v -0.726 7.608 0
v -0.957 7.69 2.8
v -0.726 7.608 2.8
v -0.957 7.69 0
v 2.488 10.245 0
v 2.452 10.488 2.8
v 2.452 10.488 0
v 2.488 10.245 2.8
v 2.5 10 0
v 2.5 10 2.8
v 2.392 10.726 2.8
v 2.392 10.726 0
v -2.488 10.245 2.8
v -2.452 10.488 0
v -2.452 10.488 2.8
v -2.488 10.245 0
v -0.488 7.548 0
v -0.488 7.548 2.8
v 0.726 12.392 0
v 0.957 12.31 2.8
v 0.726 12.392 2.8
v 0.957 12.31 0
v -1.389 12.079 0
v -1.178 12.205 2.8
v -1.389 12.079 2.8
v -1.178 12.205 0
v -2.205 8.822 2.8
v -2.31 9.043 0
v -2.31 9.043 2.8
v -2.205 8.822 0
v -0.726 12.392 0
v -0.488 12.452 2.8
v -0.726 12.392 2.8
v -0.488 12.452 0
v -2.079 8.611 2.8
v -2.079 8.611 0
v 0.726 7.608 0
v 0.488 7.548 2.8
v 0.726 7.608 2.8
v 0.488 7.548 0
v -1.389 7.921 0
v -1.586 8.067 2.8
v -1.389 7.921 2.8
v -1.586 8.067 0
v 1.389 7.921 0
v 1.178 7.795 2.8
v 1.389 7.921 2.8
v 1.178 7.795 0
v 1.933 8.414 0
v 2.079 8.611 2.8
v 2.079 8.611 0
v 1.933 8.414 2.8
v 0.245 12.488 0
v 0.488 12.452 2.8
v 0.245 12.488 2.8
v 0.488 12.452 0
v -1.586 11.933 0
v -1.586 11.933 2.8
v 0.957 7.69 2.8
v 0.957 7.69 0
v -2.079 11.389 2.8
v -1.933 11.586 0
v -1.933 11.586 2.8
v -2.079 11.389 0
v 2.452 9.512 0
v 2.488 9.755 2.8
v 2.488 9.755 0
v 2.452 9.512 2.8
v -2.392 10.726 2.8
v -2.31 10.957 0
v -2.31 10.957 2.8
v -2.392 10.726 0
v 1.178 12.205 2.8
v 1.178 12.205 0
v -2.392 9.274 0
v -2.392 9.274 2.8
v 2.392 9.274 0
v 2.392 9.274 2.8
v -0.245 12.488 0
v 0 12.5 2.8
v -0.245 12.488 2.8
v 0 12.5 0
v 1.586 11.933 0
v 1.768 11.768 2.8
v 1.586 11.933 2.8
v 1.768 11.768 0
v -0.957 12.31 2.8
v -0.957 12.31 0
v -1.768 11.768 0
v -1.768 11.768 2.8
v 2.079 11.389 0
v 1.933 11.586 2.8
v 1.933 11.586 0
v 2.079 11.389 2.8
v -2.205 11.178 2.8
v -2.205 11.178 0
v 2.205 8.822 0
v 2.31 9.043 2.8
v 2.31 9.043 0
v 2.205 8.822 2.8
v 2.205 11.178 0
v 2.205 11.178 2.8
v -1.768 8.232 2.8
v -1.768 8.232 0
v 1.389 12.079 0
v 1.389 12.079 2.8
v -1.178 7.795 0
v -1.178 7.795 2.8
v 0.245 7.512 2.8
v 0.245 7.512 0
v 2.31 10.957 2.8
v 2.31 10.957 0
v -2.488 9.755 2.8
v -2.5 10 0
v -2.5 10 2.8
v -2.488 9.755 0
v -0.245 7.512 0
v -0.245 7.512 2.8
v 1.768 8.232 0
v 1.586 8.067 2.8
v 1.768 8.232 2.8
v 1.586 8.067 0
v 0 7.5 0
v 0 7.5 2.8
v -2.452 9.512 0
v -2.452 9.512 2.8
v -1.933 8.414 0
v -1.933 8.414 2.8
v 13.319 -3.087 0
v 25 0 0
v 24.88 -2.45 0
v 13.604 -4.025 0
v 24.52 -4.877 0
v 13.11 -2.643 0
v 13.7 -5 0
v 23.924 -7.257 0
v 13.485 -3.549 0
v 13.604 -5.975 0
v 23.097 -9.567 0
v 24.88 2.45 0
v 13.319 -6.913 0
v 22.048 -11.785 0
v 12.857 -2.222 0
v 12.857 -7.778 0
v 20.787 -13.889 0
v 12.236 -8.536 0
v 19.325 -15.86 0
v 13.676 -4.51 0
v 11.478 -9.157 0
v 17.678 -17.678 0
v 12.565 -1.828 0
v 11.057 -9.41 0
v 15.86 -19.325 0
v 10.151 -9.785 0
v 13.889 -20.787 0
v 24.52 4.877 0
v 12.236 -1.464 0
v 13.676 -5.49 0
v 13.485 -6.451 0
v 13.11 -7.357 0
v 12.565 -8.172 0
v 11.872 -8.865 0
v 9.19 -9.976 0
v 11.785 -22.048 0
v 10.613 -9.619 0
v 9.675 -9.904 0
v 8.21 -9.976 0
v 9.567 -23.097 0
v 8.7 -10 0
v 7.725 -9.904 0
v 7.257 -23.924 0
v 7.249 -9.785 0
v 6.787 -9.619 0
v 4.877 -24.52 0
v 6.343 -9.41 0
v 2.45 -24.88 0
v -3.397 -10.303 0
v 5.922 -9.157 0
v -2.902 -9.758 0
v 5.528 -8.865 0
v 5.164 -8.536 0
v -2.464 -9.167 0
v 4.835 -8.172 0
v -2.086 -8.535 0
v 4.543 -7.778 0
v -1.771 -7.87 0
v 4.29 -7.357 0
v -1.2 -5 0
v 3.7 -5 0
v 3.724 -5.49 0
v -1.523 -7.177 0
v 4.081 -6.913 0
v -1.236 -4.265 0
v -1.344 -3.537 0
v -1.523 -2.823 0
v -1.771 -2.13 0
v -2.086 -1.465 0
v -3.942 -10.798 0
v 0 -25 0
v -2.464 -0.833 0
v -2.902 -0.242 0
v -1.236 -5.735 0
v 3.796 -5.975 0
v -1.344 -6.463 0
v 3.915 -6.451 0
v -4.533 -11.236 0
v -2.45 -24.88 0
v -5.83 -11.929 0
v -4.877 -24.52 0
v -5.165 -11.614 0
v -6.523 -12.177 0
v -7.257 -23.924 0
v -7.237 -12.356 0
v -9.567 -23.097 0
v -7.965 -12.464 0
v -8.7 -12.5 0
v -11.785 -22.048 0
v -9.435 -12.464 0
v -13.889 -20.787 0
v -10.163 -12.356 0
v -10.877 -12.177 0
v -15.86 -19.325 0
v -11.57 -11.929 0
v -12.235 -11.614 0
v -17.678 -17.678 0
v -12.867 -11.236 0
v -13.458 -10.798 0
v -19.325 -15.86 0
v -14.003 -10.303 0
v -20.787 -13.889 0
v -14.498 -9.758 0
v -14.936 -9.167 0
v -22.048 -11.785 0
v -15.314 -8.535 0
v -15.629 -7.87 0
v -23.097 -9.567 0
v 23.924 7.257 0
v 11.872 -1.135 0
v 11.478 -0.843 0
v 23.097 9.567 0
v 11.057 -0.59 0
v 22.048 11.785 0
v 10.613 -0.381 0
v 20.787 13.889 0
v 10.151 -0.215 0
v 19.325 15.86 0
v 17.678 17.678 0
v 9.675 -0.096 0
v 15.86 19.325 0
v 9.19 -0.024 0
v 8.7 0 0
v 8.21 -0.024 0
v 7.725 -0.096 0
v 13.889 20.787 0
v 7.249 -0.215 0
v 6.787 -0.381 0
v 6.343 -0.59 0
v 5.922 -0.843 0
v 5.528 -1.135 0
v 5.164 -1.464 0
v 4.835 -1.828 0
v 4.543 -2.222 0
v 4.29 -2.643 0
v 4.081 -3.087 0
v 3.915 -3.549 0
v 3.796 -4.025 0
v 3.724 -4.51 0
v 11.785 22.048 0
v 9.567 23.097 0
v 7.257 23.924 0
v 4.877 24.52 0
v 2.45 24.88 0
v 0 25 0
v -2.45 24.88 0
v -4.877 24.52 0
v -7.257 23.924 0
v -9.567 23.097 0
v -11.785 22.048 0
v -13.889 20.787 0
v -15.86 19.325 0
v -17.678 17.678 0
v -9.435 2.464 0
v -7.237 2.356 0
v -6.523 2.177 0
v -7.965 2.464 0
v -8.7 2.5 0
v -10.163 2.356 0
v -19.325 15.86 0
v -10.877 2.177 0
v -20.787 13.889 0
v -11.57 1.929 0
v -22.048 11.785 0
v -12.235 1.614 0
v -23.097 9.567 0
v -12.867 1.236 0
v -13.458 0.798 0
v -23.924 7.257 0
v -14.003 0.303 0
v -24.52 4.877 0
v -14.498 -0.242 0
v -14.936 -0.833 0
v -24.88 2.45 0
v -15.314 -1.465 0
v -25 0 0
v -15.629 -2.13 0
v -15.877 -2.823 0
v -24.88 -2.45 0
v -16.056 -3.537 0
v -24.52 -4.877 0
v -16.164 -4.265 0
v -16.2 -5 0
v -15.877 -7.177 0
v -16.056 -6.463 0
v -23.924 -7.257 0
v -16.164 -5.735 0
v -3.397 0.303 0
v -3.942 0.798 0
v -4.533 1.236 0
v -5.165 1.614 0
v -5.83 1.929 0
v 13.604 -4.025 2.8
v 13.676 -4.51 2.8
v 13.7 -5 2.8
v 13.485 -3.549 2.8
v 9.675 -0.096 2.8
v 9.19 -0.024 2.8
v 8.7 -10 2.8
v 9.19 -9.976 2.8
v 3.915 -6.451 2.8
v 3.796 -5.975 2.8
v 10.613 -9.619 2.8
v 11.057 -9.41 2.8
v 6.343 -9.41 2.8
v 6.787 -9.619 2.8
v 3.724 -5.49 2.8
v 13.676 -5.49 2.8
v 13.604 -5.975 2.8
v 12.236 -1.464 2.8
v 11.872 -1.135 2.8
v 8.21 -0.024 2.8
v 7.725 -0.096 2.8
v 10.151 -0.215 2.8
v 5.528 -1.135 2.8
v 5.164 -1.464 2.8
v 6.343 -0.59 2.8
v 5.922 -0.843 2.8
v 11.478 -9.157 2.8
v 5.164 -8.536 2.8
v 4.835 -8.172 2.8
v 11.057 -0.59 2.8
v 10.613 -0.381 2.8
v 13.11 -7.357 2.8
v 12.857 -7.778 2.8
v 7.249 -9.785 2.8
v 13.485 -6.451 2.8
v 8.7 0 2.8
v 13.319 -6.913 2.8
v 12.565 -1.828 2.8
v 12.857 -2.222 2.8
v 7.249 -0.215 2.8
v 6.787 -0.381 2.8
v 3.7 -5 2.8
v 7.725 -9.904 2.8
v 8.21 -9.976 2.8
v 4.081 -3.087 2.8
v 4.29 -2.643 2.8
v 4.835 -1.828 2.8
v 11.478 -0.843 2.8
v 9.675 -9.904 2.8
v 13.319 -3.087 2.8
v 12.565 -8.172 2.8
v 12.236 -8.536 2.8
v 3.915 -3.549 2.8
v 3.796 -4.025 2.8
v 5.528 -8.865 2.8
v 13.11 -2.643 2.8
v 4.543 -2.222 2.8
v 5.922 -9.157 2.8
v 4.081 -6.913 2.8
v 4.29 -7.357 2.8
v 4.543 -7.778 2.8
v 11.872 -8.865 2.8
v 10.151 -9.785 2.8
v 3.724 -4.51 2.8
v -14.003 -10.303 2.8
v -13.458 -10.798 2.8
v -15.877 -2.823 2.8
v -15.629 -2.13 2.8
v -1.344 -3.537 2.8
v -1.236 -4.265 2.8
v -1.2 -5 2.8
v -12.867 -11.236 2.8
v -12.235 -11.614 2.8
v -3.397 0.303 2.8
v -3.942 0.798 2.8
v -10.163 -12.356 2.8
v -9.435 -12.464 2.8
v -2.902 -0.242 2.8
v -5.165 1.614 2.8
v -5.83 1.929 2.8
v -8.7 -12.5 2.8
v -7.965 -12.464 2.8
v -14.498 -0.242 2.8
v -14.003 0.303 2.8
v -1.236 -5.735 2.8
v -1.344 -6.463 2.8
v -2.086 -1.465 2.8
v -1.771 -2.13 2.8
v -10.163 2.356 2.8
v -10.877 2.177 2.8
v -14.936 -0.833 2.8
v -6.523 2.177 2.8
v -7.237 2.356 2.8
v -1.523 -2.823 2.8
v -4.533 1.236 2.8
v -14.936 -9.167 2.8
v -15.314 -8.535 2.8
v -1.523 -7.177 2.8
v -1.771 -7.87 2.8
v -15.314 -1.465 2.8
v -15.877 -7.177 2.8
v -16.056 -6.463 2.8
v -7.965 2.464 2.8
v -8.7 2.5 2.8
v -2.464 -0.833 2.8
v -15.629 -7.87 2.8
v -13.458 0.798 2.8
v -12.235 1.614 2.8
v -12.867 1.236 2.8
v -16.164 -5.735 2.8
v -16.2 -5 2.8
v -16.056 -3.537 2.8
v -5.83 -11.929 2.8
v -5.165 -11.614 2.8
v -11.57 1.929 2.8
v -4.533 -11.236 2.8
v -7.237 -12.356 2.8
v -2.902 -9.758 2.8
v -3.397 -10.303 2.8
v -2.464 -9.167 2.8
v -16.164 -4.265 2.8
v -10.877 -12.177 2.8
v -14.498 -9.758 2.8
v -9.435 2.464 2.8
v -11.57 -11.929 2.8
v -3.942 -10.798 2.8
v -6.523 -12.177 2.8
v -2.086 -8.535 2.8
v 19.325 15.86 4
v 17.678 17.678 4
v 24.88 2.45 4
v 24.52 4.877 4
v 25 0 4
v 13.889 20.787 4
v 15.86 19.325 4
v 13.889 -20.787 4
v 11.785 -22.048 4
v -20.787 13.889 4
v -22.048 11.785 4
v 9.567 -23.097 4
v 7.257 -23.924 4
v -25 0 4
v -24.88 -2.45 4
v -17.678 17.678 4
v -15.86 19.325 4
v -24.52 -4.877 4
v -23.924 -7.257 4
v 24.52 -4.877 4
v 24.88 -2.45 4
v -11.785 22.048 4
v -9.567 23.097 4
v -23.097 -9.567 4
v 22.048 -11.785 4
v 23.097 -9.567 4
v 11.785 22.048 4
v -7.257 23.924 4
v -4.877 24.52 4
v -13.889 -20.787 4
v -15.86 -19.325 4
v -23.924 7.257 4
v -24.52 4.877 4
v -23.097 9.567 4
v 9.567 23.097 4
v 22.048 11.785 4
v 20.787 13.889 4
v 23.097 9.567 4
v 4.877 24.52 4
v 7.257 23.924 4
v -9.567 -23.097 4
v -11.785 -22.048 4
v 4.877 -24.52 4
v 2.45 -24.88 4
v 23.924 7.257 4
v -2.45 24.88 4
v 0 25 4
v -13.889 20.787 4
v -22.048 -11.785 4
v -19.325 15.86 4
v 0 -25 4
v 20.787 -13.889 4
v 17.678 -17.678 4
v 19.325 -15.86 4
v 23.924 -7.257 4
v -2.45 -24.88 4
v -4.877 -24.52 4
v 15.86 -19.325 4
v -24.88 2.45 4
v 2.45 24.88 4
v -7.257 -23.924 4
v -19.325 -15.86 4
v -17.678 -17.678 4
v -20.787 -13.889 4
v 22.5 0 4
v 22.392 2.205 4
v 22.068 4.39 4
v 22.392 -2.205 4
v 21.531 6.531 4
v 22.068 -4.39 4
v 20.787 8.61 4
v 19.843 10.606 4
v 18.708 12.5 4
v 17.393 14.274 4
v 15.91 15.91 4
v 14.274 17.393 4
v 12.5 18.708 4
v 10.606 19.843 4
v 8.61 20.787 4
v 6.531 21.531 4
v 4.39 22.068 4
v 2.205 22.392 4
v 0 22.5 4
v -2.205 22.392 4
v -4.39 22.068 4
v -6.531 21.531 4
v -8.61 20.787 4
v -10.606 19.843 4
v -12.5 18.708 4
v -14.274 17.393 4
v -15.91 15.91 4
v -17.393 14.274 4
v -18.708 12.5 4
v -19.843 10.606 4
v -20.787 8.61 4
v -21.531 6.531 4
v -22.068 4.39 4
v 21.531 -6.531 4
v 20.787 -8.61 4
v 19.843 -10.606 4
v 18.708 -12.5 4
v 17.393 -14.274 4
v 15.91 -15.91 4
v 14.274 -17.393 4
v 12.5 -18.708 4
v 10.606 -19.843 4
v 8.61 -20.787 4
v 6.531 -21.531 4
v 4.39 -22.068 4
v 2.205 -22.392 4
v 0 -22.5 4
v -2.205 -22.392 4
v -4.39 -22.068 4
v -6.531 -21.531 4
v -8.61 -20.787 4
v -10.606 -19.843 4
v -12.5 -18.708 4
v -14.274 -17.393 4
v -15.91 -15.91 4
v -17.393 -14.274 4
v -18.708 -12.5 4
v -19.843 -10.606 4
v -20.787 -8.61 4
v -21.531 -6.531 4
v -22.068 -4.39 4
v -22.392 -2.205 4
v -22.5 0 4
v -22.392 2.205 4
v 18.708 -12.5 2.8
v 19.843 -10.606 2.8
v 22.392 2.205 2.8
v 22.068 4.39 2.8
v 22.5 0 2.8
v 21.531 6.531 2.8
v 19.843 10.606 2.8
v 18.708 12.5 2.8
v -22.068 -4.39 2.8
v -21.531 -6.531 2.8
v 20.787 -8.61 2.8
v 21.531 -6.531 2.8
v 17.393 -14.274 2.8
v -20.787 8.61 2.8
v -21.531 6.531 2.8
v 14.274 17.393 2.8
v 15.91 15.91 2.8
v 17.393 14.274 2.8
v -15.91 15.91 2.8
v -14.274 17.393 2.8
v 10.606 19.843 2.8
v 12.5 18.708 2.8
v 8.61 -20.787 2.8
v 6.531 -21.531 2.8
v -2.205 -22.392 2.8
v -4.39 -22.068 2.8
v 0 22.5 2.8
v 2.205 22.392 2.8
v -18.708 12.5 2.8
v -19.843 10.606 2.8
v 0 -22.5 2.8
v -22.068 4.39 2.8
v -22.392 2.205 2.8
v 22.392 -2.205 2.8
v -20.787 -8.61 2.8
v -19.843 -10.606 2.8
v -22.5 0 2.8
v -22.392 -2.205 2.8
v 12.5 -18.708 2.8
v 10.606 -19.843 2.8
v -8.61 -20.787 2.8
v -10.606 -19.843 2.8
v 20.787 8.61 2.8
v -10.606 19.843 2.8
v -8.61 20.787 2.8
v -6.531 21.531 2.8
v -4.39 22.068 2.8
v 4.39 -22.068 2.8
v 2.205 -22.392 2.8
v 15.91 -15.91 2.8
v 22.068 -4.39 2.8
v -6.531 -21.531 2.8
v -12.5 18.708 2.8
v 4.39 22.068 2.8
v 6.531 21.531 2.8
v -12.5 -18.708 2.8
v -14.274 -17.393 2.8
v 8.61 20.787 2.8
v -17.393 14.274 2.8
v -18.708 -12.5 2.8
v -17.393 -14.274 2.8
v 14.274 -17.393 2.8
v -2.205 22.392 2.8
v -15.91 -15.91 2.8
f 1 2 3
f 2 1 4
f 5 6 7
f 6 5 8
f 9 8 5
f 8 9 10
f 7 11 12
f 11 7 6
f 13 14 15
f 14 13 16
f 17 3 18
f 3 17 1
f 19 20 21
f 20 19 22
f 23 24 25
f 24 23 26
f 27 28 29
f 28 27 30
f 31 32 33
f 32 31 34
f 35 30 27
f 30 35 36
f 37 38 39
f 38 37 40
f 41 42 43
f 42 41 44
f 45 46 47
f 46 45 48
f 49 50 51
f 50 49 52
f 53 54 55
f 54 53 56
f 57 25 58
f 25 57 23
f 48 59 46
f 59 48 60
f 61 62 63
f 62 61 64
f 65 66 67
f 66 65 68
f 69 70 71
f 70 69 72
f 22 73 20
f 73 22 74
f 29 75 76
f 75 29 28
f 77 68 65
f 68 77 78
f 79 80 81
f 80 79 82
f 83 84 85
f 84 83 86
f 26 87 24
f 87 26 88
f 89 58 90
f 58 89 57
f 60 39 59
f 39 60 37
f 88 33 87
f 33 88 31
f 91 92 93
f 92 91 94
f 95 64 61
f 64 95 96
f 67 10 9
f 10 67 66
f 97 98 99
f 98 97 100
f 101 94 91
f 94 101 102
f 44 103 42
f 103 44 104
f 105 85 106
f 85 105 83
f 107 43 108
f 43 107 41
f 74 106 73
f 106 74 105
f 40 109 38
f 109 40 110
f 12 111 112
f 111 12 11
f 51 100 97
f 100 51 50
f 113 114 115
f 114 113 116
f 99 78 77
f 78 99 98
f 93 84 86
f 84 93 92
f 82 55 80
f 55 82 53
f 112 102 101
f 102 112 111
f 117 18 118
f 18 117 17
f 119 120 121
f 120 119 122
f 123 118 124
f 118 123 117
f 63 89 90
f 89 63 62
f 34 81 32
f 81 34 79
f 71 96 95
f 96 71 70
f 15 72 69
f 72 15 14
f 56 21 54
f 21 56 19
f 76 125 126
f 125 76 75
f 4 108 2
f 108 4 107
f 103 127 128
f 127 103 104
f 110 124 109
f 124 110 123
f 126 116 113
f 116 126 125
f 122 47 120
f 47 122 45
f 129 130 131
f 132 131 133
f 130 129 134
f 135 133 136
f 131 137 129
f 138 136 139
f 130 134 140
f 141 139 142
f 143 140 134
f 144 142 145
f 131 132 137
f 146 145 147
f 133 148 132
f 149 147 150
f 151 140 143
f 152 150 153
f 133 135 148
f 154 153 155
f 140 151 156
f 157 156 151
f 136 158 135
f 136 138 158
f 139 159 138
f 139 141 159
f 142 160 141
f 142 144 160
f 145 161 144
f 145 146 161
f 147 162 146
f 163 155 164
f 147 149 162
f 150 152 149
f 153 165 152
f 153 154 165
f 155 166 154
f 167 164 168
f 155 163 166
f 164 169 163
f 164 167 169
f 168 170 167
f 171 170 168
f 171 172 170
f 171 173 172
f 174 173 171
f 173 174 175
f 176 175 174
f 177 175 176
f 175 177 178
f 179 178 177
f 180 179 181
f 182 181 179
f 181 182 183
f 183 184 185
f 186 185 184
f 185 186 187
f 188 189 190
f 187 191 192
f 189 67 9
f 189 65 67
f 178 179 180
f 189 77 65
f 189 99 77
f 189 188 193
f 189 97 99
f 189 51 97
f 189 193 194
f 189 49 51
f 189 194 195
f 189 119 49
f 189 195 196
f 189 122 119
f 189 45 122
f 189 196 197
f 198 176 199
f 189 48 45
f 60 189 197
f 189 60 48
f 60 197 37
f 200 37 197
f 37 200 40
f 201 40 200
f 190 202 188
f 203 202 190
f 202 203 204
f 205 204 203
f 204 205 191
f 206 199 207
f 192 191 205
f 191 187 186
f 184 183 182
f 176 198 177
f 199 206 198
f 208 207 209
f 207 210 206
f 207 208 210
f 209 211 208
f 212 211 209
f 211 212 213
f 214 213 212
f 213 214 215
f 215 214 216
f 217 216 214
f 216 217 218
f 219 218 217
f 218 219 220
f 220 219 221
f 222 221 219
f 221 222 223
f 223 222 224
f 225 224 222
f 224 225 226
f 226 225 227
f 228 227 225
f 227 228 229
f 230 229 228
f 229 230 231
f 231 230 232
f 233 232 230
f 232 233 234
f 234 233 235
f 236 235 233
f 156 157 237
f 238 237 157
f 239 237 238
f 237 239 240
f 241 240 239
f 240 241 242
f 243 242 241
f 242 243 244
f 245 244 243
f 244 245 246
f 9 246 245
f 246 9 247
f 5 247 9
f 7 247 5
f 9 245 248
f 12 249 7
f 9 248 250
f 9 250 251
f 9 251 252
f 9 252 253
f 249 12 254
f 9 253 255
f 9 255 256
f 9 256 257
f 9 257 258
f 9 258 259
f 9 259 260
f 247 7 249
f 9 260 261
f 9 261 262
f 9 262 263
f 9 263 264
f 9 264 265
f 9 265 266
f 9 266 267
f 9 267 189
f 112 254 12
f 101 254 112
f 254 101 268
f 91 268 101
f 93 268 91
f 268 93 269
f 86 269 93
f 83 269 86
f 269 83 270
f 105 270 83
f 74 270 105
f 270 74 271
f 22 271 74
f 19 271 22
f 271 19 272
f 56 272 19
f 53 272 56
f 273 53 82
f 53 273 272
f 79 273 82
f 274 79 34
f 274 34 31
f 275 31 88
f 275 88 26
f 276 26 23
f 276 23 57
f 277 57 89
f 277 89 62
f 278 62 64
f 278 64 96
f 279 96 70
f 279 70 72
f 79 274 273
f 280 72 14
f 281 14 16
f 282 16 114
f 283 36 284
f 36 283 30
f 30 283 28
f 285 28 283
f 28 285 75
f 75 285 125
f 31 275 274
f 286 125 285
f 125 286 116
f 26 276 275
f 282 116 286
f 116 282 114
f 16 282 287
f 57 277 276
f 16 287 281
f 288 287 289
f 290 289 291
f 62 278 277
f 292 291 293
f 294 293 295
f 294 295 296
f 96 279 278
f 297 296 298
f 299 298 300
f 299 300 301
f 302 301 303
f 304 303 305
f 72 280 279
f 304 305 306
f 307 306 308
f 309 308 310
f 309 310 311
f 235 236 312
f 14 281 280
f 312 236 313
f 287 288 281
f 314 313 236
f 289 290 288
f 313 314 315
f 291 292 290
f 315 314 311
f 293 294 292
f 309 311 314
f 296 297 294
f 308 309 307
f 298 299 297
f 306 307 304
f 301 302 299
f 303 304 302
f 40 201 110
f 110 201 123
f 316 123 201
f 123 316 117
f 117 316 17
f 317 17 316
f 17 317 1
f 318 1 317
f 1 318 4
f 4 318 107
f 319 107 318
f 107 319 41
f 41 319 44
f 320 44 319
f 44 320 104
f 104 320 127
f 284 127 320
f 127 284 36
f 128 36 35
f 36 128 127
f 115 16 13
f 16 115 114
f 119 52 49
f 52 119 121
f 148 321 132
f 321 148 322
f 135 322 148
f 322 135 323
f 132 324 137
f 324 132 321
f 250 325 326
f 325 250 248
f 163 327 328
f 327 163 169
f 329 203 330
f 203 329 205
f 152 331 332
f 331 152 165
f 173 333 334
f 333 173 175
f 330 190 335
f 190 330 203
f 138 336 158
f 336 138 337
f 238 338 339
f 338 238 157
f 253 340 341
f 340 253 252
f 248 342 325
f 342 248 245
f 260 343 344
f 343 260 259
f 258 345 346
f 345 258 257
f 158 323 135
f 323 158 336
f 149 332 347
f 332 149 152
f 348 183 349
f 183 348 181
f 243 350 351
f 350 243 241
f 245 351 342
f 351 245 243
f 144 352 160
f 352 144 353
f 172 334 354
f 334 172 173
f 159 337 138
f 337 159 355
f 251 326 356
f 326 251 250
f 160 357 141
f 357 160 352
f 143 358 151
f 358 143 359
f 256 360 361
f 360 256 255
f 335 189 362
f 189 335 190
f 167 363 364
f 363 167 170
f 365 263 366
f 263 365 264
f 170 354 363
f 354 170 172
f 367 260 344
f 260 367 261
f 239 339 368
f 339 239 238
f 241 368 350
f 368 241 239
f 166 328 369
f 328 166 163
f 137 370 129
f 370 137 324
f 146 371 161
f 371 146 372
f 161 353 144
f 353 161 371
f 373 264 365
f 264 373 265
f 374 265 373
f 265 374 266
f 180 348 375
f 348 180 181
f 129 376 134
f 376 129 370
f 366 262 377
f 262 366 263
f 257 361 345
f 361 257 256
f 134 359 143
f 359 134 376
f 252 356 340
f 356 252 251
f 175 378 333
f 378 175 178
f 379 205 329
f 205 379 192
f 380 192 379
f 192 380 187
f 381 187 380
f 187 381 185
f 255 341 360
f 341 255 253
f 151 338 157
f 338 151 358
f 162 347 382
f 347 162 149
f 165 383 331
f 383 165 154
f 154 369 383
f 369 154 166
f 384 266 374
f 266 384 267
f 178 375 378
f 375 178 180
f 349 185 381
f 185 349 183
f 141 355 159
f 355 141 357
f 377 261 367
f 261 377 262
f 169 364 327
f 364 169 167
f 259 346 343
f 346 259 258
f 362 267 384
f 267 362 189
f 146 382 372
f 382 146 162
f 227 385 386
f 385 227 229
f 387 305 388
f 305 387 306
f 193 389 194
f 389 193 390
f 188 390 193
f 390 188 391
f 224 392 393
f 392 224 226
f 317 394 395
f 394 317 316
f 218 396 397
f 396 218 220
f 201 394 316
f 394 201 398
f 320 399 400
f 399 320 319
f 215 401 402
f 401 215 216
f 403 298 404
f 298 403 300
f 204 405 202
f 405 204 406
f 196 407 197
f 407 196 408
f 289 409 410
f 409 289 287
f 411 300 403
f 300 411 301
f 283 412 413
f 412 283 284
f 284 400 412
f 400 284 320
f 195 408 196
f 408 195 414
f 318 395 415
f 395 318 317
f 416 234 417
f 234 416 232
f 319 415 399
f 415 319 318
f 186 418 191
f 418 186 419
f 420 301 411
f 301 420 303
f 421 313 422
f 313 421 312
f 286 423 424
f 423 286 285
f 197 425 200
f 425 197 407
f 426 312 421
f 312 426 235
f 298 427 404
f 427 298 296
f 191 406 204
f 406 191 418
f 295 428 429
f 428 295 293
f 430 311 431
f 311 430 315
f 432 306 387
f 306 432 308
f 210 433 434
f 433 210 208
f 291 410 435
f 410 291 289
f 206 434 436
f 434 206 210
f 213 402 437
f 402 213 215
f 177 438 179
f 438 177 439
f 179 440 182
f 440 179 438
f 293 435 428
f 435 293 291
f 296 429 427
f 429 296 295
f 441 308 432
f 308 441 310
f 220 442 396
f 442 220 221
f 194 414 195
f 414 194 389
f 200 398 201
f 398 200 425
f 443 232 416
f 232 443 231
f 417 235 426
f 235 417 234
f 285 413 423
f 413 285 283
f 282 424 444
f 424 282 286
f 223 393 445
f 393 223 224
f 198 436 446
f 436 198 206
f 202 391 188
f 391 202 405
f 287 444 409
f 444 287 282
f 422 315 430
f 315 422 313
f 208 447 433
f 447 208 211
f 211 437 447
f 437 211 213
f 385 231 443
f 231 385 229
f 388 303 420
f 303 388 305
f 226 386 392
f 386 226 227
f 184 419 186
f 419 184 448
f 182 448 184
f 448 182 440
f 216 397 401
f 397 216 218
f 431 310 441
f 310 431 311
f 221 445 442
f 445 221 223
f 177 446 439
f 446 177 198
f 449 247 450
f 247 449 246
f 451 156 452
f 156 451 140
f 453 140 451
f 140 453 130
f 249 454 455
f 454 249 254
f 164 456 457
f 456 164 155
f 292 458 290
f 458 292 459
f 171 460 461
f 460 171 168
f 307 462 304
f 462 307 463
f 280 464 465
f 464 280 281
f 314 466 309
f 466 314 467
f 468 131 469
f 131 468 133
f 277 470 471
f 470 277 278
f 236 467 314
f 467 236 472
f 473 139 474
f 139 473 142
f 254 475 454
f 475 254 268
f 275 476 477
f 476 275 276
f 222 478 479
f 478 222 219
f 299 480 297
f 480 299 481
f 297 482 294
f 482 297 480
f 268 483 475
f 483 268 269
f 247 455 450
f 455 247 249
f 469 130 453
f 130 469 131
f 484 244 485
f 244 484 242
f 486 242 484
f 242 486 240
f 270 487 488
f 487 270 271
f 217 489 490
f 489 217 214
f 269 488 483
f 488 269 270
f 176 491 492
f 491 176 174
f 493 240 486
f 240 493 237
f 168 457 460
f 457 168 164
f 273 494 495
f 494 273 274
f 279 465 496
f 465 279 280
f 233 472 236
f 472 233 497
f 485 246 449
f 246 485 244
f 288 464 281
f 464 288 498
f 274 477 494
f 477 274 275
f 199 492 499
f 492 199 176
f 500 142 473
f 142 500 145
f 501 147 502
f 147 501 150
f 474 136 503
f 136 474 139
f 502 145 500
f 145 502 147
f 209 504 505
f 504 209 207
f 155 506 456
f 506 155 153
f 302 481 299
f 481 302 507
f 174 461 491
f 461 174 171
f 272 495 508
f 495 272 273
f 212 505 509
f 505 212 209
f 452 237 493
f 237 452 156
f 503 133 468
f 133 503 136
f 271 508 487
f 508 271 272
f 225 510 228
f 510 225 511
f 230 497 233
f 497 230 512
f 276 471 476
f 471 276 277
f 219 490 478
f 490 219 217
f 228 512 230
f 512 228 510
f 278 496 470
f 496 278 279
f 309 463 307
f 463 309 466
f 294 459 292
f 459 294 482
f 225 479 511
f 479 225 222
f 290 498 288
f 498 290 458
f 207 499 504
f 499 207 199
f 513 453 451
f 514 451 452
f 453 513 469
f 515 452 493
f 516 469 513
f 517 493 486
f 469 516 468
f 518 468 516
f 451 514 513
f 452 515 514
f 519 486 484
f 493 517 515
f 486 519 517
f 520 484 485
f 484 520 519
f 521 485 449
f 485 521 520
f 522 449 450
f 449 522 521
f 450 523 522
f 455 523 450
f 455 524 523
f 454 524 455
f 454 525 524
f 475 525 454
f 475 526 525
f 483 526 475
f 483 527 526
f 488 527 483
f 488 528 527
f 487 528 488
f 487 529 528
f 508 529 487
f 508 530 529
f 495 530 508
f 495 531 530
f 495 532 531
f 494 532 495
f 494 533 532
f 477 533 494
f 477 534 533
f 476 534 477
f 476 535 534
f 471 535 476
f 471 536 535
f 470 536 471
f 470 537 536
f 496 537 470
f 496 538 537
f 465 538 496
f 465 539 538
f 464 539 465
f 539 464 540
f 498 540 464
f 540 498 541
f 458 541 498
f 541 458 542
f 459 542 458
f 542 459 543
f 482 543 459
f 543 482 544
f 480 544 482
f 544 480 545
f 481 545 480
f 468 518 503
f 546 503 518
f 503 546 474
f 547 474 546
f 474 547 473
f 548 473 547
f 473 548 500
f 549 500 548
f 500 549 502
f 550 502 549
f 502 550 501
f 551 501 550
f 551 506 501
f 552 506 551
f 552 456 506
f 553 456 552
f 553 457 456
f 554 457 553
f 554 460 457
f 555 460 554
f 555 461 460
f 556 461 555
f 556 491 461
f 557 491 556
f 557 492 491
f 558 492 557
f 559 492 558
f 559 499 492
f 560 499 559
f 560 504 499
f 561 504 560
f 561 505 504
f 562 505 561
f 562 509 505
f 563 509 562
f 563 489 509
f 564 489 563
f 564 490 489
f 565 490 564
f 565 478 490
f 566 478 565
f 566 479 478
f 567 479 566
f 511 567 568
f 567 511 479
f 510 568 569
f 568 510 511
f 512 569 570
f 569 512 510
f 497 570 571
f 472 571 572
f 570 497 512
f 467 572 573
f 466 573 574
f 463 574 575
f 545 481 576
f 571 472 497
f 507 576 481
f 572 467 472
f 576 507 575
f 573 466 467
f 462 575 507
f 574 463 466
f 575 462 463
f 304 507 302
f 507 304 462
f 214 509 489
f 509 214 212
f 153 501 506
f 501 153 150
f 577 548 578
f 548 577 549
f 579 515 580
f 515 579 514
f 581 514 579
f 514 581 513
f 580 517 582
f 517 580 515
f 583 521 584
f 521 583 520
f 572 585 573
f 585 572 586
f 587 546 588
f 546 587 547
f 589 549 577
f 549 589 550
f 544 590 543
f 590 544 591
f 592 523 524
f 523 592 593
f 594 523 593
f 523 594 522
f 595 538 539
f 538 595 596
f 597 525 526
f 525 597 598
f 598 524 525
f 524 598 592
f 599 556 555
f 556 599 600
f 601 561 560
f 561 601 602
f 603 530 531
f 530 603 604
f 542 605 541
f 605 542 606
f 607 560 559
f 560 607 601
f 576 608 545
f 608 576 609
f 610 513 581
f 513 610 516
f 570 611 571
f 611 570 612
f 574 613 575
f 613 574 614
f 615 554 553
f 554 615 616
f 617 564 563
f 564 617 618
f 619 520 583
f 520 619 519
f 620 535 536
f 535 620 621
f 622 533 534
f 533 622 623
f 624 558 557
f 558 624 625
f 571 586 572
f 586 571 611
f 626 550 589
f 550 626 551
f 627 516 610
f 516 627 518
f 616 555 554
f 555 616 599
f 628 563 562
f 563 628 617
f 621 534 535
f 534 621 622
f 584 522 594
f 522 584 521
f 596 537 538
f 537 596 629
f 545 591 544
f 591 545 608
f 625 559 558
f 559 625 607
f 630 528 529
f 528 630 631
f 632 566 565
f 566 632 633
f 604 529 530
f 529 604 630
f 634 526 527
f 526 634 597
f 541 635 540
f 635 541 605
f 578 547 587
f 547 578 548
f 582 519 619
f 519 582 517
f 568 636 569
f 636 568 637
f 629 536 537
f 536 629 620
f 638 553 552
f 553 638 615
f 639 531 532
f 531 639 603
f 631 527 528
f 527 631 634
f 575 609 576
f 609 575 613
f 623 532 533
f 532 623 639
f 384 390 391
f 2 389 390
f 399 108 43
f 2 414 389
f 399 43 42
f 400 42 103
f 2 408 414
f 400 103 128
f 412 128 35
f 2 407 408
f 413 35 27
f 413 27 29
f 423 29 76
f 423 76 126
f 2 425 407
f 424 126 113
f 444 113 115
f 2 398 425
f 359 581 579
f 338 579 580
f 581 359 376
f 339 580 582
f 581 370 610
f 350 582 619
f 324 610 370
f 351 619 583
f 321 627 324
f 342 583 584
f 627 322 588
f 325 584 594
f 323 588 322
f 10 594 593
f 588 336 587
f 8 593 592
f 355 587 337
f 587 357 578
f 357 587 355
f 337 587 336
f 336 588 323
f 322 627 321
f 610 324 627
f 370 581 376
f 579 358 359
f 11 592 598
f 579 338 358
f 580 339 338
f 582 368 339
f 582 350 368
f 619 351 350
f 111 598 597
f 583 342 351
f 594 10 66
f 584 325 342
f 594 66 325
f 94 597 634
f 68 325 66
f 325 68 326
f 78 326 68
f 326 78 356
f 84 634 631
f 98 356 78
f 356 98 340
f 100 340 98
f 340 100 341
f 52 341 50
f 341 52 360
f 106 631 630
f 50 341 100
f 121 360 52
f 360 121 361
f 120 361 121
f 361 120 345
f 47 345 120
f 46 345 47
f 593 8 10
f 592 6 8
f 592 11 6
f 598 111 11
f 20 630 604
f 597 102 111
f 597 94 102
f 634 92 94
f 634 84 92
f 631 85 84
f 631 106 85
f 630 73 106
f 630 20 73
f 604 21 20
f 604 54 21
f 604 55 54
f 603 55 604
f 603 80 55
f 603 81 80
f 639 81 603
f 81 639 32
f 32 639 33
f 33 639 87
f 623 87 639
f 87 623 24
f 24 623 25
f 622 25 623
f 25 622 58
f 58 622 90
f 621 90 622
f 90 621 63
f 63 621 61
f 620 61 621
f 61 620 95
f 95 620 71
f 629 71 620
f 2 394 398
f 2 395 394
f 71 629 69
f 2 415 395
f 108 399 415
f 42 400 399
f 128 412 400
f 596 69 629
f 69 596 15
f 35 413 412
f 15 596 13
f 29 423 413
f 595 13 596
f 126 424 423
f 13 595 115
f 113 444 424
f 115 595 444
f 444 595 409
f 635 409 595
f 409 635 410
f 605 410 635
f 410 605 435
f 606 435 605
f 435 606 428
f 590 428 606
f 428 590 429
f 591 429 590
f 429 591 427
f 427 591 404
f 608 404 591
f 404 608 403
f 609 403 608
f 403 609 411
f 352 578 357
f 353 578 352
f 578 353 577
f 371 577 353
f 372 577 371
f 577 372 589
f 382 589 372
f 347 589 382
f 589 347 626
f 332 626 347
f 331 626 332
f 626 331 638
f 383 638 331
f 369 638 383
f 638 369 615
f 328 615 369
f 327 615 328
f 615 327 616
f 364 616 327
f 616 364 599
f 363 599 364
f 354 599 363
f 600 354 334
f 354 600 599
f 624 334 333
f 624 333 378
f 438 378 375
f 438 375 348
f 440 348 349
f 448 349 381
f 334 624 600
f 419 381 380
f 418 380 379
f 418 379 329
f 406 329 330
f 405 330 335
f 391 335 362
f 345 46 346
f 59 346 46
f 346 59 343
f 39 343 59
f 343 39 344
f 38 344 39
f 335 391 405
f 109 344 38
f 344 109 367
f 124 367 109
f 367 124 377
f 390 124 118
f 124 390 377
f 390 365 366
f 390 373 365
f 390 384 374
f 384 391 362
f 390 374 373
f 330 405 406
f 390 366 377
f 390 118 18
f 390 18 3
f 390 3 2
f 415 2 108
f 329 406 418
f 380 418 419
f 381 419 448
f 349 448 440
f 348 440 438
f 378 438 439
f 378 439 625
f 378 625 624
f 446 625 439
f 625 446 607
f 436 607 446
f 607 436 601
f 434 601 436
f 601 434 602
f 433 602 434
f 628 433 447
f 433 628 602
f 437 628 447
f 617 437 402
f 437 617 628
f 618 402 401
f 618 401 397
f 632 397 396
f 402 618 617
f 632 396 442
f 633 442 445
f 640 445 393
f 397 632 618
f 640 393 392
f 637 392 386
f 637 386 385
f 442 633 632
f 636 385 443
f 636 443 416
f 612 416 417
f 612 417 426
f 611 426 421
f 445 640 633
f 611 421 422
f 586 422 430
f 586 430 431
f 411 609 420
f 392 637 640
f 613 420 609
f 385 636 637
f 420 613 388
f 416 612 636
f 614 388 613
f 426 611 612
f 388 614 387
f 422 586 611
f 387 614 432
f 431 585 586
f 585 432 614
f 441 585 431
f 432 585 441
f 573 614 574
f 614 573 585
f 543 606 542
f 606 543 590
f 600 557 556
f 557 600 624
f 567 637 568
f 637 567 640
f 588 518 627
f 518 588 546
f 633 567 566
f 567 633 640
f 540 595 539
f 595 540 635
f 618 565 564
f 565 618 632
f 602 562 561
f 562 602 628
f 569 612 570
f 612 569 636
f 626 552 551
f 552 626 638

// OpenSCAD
// [FL_INDEX: keywords="openscad, 3d_parametric, Circular_DIz_Fiber_Tool, csg_solid" | COT="Parametric OpenSCAD design from 3DCodeverse"]
// Title: Circular DIz Fiber Tool

$fn = 64*1;

diameter = 50; //[25:75]
height = 4; //[4:7]
number_of_holes = 3; //[1:5]
hole_diameter_start = 5; //[5:20]
hole_diameter_end = 15; //[15:40]
hole_offset = 10; //[0:50]
lip_ratio = 70; //[0:100]
edge_ratio = 90; //[0:100]

main();

module main(){
	difference(){
		cylinder(h = height, r = diameter/2); 
		if (number_of_holes == 1) {
			oneHole();
		} else if (number_of_holes == 2) {
			twoHoles();
		} else if (number_of_holes == 3) {
			threeHoles();
		} else if (number_of_holes == 4){
			fourHoles();
		} else {
			fiveHoles();
		}
		translate(v=[0,0,height*lip_ratio*.01])
		cylinder(h = 25, r = diameter/2*edge_ratio*.01);
	}
}

module oneHole() {
	cylinder(h=25, r = hole_diameter_start/2);
}

module twoHoles() {
	translate(v=[hole_offset, 0, 0])
	cylinder(h = 25, r = hole_diameter_start/2);
	translate(v=[-hole_offset, 0, 0])
	cylinder(h = 25, r = hole_diameter_end/2);	
}

module threeHoles() {
	translate(v=[0, hole_offset, 0])
	cylinder(h = 25, r = hole_diameter_start/2);
	translate(v=[.87*hole_offset, -.5*hole_offset, 0])
	cylinder(h = 25, r = ( hole_diameter_end - hole_diameter_start )/2);
	translate(v=[-.87*hole_offset, -.5*hole_offset, 0])
	cylinder(h = 25, r = hole_diameter_end/2);	
}

module fourHoles() {
	translate(v=[hole_offset, hole_offset, 0])
	cylinder(h = 25, r = hole_diameter_start/2);
	translate(v=[-hole_offset, hole_offset, 0])
	cylinder(h = 25, r = ( hole_diameter_end - hole_diameter_start )/6 + hole_diameter_start/2);	
	translate(v=[hole_offset, -hole_offset, 0])
	cylinder(h = 25, r = ( hole_diameter_end - hole_diameter_start )/3 + hole_diameter_start/2);	
	translate(v=[-hole_offset,-hole_offset,0])
	cylinder(h = 25, r = hole_diameter_end/2);
}

module fiveHoles() {
	translate(v=[0, hole_offset, 0])
	cylinder(h = 25, r = hole_diameter/2);
	translate(v=[hole_offset*.95, hole_offset*.31, 0])
	cylinder(h = 25, r =     ( hole_diameter_end - hole_diameter_start )/8 + hole_diameter_start/2);	
	translate(v=[hole_offset*.59, -hole_offset*.81, 0])
	cylinder(h = 25, r =     ( hole_diameter_end - hole_diameter_start )/4 + hole_diameter_start/2);	
	translate(v=[-hole_offset*.59,-hole_offset*.81,0])
	cylinder(h = 25, r = 3 * ( hole_diameter_end - hole_diameter_start )/8 + hole_diameter_start/2);	
	translate(v=[-hole_offset*.95,hole_offset*.31,0])
	cylinder(h = 25, r = hole_diameter/2);
}
